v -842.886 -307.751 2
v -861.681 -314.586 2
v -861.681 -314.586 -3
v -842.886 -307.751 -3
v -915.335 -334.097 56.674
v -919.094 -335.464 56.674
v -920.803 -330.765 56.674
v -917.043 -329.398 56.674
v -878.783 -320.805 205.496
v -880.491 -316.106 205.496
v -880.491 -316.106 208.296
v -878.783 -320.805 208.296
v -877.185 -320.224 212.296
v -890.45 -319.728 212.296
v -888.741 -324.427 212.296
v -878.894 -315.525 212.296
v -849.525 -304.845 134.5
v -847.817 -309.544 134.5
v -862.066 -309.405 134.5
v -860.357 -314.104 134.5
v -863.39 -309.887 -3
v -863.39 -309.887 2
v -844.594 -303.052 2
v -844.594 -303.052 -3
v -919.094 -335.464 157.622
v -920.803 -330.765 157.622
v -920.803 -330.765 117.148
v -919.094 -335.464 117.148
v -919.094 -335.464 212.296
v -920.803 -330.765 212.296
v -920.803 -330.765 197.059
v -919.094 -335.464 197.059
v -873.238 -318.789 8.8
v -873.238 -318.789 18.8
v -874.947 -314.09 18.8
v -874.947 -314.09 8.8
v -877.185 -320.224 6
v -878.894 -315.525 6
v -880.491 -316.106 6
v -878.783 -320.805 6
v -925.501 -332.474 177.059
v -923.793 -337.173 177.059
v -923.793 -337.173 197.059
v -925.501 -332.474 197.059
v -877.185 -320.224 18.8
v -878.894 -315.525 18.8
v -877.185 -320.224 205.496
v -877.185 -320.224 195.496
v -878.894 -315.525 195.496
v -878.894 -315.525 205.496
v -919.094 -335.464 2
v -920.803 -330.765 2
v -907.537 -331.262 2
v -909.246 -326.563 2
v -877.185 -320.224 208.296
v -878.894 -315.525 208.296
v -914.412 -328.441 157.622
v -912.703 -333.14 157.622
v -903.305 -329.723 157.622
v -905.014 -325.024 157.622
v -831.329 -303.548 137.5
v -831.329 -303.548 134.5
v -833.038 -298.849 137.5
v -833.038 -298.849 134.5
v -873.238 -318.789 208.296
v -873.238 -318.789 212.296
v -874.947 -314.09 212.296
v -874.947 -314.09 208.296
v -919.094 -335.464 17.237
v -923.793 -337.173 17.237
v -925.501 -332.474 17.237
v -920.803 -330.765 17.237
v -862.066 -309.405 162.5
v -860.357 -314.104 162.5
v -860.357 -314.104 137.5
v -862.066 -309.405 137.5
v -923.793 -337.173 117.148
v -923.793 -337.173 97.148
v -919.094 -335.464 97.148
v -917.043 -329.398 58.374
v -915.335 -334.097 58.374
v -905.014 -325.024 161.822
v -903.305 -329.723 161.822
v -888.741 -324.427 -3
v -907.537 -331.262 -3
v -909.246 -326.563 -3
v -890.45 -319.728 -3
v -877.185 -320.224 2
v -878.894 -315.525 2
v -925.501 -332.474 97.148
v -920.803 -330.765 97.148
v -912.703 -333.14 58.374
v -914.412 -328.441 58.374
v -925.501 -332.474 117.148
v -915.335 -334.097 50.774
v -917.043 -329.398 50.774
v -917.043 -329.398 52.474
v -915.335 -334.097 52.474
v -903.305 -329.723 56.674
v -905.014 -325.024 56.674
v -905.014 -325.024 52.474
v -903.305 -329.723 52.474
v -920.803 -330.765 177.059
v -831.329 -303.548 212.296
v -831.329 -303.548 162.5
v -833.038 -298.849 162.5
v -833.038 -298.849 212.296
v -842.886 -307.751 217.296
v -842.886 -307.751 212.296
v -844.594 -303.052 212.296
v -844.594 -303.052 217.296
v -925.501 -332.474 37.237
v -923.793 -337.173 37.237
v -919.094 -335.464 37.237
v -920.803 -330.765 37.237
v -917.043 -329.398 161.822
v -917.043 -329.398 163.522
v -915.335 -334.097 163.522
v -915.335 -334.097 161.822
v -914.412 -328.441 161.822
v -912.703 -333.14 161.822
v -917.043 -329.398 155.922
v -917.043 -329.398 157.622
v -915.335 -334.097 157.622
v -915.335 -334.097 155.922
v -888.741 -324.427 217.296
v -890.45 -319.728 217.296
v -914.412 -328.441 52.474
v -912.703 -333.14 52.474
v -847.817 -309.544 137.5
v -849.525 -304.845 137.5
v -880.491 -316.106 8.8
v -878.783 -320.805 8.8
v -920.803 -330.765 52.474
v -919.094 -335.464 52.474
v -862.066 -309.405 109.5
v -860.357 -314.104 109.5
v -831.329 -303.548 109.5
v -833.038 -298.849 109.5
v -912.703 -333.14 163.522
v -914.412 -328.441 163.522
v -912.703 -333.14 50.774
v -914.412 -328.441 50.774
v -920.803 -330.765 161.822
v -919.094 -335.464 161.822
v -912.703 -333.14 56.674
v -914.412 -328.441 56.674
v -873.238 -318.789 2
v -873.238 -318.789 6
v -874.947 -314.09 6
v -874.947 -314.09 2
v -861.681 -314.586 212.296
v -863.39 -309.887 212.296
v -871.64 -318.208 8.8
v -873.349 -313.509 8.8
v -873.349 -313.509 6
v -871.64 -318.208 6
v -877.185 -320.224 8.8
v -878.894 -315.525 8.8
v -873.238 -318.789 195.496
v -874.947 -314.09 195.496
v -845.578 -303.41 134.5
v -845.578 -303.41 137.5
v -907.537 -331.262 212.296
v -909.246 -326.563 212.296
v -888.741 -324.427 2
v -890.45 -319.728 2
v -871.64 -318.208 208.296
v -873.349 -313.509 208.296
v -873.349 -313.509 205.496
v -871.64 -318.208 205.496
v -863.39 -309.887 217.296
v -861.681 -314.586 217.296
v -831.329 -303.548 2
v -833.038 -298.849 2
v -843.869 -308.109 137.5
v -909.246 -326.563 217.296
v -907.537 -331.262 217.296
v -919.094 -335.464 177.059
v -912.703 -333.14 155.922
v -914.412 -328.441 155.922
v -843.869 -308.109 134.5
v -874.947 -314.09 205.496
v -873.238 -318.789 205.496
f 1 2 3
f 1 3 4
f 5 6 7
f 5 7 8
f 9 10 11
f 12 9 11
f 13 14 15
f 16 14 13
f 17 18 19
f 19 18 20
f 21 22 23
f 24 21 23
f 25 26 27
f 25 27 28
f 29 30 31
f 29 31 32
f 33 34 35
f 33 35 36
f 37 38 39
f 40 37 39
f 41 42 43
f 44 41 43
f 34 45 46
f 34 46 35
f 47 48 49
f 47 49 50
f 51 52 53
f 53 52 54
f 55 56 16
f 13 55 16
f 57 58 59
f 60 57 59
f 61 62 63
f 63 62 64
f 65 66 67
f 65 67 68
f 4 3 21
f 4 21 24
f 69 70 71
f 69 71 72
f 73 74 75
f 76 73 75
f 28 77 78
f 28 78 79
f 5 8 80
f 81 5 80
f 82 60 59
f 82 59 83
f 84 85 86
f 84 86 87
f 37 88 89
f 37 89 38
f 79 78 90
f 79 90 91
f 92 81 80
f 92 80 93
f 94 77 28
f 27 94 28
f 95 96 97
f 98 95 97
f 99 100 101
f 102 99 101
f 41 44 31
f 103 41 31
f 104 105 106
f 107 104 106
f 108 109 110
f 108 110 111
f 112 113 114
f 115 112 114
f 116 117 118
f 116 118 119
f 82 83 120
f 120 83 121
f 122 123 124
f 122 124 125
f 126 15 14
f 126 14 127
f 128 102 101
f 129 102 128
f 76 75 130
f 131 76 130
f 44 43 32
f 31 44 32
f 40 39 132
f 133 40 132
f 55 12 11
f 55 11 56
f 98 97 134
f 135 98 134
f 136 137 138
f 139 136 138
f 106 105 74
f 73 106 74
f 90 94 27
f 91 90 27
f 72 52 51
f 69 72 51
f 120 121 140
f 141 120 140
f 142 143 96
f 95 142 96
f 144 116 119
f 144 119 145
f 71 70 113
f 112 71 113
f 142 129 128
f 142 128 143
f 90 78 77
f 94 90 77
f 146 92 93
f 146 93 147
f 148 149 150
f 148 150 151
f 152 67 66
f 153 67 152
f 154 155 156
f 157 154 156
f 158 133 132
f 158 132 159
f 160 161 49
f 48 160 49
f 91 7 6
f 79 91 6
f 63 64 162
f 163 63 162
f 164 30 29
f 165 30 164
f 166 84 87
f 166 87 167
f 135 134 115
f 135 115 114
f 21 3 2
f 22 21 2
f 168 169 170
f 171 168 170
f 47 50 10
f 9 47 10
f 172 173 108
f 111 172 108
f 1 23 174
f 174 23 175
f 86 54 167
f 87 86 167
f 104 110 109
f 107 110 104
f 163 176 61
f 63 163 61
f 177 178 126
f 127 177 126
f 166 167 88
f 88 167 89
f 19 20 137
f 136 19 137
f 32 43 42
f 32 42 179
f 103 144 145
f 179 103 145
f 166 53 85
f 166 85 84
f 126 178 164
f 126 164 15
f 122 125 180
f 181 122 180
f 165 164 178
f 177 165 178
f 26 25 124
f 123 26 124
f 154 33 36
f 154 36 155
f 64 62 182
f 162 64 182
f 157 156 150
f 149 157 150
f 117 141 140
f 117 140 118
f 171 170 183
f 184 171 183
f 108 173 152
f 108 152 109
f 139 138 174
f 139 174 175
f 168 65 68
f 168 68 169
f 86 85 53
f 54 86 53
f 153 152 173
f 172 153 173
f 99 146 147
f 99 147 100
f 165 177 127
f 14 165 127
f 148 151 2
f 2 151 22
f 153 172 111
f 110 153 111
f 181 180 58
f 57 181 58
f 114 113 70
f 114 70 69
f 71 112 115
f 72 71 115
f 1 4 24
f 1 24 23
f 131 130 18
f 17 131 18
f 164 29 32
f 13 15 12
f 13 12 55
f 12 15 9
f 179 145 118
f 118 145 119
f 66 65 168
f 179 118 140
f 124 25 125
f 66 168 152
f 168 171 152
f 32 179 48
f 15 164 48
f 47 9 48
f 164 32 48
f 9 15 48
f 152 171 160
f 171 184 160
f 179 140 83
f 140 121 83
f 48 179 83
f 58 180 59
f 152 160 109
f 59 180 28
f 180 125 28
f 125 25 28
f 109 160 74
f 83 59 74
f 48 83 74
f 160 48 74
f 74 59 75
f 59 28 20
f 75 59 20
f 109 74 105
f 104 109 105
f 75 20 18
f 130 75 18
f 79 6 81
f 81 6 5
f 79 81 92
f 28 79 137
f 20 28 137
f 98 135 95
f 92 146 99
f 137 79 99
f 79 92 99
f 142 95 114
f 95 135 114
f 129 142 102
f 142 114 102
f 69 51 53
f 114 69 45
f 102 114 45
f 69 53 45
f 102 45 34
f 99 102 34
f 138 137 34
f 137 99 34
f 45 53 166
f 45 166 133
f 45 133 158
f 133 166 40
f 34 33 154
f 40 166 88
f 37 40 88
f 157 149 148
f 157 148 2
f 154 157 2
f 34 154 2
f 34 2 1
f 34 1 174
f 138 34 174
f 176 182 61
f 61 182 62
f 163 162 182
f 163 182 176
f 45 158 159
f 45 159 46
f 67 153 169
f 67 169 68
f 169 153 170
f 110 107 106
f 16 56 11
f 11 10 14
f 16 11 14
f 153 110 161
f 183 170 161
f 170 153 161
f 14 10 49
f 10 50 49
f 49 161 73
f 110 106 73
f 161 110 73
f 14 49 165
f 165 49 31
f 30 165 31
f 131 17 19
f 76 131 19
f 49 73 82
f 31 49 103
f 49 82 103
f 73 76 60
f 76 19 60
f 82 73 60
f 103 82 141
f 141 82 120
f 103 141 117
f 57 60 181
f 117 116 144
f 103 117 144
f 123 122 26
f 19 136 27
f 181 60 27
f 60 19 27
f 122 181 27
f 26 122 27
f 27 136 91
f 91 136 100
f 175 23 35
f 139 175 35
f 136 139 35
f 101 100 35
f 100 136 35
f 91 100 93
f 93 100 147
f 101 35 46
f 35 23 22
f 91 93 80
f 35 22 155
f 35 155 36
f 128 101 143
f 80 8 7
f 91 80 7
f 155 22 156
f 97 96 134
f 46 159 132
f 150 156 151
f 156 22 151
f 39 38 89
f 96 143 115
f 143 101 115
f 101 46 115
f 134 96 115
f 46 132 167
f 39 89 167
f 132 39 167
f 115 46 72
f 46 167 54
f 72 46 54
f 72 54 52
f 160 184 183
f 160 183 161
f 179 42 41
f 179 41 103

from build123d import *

# Parameters (mm, degrees)
BOSS_EXTRUDE1_DEPTH = 210.295833
CUT_EXTRUDE3_DEPTH  = 35.994480169
SKETCH5_W           = 20
SKETCH5_H           = 5
SKETCH5_W_2         = 5
SKETCH5_H_2         = 20
BOSS_EXTRUDE2_DEPTH = 5


with BuildPart() as part:
    # Sketch2 → Boss-Extrude1 (new body)
    with BuildSketch(Plane.XY.offset(2)):
        Polygon((-920.802501065, -330.765461908), (-919.09369882, -335.464397413), (-831.329066449, -303.548147303), (-833.037868694, -298.849211798), align=None)
    extrude(amount=BOSS_EXTRUDE1_DEPTH)

    # Sketch4 → Cut-Extrude3 (cut, through all)
    with BuildSketch(Plane(origin=(0.394814779, -1.085678105, 0), x_dir=(-0.939787101, -0.341760449, 0), z_dir=(0.341760449, -0.939787101, 0))):
        Polygon((929.606975284, -2), (933.806975284, -2), (933.806975284, -6), (935.506975284, -6), (935.506975284, -8.8), (933.806975284, -8.8), (933.806975284, -18.8), (929.606975284, -18.8), (929.606975284, -8.8), (927.906975284, -8.8), (927.906975284, -6), (929.606975284, -6), align=None)
        Polygon((978.400865988, -52.473958269), (978.400865988, -56.673958269), (974.400865988, -56.673958269), (974.400865988, -58.373958269), (971.600865988, -58.373958269), (971.600865988, -56.673958269), (961.600865988, -56.673958269), (961.600865988, -52.473958269), (971.600865988, -52.473958269), (971.600865988, -50.773958269), (974.400865988, -50.773958269), (974.400865988, -52.473958269), align=None)
        Polygon((933.806975284, -212.295833075), (929.606975284, -212.295833075), (929.606975284, -208.295833075), (927.906975284, -208.295833075), (927.906975284, -205.495833075), (929.606975284, -205.495833075), (929.606975284, -195.495833075), (933.806975284, -195.495833075), (933.806975284, -205.495833075), (935.506975284, -205.495833075), (935.506975284, -208.295833075), (933.806975284, -208.295833075), align=None)
        Polygon((974.400865988, -157.621874806), (974.400865988, -155.921874806), (971.600865988, -155.921874806), (971.600865988, -157.621874806), (961.600865988, -157.621874806), (961.600865988, -161.821874806), (971.600865988, -161.821874806), (971.600865988, -163.521874806), (974.400865988, -163.521874806), (974.400865988, -161.821874806), (978.400865988, -161.821874806), (978.400865988, -157.621874806), align=None)
        Polygon((885.01308458, -134.5), (898.356975284, -134.5), (898.356975284, -137.5), (885.01308458, -137.5), (885.01308458, -162.5), (915.900865988, -162.5), (915.900865988, -137.5), (902.556975284, -137.5), (902.556975284, -134.5), (915.900865988, -134.5), (915.900865988, -109.5), (885.01308458, -109.5), align=None)
    extrude(amount=-CUT_EXTRUDE3_DEPTH, mode=Mode.SUBTRACT)

    # Sketch5 → Boss-Extrude2 (add)
    with BuildSketch(Plane(origin=(0.394814779, -1.085678105, 0), x_dir=(0.939787101, 0.341760449, 0), z_dir=(0.341760449, -0.939787101, 0))):
        with Locations((-956.103920636, 214.795833075)):
            Rectangle(SKETCH5_W, SKETCH5_H)
        with Locations((-907.310029932, 214.795833075)):
            Rectangle(SKETCH5_W, SKETCH5_H)
        with Locations((-980.900865988, 187.058853941)):
            Rectangle(SKETCH5_W_2, SKETCH5_H_2)
        with Locations((-980.900865988, 107.147916538)):
            Rectangle(SKETCH5_W_2, SKETCH5_H_2)
        with Locations((-980.900865988, 27.236979134)):
            Rectangle(SKETCH5_W_2, SKETCH5_H_2)
        with Locations((-956.103920636, -0.5)):
            Rectangle(SKETCH5_W, SKETCH5_H)
        with Locations((-907.310029932, -0.5)):
            Rectangle(SKETCH5_W, SKETCH5_H)
    extrude(amount=-BOSS_EXTRUDE2_DEPTH)


solid = part.part
